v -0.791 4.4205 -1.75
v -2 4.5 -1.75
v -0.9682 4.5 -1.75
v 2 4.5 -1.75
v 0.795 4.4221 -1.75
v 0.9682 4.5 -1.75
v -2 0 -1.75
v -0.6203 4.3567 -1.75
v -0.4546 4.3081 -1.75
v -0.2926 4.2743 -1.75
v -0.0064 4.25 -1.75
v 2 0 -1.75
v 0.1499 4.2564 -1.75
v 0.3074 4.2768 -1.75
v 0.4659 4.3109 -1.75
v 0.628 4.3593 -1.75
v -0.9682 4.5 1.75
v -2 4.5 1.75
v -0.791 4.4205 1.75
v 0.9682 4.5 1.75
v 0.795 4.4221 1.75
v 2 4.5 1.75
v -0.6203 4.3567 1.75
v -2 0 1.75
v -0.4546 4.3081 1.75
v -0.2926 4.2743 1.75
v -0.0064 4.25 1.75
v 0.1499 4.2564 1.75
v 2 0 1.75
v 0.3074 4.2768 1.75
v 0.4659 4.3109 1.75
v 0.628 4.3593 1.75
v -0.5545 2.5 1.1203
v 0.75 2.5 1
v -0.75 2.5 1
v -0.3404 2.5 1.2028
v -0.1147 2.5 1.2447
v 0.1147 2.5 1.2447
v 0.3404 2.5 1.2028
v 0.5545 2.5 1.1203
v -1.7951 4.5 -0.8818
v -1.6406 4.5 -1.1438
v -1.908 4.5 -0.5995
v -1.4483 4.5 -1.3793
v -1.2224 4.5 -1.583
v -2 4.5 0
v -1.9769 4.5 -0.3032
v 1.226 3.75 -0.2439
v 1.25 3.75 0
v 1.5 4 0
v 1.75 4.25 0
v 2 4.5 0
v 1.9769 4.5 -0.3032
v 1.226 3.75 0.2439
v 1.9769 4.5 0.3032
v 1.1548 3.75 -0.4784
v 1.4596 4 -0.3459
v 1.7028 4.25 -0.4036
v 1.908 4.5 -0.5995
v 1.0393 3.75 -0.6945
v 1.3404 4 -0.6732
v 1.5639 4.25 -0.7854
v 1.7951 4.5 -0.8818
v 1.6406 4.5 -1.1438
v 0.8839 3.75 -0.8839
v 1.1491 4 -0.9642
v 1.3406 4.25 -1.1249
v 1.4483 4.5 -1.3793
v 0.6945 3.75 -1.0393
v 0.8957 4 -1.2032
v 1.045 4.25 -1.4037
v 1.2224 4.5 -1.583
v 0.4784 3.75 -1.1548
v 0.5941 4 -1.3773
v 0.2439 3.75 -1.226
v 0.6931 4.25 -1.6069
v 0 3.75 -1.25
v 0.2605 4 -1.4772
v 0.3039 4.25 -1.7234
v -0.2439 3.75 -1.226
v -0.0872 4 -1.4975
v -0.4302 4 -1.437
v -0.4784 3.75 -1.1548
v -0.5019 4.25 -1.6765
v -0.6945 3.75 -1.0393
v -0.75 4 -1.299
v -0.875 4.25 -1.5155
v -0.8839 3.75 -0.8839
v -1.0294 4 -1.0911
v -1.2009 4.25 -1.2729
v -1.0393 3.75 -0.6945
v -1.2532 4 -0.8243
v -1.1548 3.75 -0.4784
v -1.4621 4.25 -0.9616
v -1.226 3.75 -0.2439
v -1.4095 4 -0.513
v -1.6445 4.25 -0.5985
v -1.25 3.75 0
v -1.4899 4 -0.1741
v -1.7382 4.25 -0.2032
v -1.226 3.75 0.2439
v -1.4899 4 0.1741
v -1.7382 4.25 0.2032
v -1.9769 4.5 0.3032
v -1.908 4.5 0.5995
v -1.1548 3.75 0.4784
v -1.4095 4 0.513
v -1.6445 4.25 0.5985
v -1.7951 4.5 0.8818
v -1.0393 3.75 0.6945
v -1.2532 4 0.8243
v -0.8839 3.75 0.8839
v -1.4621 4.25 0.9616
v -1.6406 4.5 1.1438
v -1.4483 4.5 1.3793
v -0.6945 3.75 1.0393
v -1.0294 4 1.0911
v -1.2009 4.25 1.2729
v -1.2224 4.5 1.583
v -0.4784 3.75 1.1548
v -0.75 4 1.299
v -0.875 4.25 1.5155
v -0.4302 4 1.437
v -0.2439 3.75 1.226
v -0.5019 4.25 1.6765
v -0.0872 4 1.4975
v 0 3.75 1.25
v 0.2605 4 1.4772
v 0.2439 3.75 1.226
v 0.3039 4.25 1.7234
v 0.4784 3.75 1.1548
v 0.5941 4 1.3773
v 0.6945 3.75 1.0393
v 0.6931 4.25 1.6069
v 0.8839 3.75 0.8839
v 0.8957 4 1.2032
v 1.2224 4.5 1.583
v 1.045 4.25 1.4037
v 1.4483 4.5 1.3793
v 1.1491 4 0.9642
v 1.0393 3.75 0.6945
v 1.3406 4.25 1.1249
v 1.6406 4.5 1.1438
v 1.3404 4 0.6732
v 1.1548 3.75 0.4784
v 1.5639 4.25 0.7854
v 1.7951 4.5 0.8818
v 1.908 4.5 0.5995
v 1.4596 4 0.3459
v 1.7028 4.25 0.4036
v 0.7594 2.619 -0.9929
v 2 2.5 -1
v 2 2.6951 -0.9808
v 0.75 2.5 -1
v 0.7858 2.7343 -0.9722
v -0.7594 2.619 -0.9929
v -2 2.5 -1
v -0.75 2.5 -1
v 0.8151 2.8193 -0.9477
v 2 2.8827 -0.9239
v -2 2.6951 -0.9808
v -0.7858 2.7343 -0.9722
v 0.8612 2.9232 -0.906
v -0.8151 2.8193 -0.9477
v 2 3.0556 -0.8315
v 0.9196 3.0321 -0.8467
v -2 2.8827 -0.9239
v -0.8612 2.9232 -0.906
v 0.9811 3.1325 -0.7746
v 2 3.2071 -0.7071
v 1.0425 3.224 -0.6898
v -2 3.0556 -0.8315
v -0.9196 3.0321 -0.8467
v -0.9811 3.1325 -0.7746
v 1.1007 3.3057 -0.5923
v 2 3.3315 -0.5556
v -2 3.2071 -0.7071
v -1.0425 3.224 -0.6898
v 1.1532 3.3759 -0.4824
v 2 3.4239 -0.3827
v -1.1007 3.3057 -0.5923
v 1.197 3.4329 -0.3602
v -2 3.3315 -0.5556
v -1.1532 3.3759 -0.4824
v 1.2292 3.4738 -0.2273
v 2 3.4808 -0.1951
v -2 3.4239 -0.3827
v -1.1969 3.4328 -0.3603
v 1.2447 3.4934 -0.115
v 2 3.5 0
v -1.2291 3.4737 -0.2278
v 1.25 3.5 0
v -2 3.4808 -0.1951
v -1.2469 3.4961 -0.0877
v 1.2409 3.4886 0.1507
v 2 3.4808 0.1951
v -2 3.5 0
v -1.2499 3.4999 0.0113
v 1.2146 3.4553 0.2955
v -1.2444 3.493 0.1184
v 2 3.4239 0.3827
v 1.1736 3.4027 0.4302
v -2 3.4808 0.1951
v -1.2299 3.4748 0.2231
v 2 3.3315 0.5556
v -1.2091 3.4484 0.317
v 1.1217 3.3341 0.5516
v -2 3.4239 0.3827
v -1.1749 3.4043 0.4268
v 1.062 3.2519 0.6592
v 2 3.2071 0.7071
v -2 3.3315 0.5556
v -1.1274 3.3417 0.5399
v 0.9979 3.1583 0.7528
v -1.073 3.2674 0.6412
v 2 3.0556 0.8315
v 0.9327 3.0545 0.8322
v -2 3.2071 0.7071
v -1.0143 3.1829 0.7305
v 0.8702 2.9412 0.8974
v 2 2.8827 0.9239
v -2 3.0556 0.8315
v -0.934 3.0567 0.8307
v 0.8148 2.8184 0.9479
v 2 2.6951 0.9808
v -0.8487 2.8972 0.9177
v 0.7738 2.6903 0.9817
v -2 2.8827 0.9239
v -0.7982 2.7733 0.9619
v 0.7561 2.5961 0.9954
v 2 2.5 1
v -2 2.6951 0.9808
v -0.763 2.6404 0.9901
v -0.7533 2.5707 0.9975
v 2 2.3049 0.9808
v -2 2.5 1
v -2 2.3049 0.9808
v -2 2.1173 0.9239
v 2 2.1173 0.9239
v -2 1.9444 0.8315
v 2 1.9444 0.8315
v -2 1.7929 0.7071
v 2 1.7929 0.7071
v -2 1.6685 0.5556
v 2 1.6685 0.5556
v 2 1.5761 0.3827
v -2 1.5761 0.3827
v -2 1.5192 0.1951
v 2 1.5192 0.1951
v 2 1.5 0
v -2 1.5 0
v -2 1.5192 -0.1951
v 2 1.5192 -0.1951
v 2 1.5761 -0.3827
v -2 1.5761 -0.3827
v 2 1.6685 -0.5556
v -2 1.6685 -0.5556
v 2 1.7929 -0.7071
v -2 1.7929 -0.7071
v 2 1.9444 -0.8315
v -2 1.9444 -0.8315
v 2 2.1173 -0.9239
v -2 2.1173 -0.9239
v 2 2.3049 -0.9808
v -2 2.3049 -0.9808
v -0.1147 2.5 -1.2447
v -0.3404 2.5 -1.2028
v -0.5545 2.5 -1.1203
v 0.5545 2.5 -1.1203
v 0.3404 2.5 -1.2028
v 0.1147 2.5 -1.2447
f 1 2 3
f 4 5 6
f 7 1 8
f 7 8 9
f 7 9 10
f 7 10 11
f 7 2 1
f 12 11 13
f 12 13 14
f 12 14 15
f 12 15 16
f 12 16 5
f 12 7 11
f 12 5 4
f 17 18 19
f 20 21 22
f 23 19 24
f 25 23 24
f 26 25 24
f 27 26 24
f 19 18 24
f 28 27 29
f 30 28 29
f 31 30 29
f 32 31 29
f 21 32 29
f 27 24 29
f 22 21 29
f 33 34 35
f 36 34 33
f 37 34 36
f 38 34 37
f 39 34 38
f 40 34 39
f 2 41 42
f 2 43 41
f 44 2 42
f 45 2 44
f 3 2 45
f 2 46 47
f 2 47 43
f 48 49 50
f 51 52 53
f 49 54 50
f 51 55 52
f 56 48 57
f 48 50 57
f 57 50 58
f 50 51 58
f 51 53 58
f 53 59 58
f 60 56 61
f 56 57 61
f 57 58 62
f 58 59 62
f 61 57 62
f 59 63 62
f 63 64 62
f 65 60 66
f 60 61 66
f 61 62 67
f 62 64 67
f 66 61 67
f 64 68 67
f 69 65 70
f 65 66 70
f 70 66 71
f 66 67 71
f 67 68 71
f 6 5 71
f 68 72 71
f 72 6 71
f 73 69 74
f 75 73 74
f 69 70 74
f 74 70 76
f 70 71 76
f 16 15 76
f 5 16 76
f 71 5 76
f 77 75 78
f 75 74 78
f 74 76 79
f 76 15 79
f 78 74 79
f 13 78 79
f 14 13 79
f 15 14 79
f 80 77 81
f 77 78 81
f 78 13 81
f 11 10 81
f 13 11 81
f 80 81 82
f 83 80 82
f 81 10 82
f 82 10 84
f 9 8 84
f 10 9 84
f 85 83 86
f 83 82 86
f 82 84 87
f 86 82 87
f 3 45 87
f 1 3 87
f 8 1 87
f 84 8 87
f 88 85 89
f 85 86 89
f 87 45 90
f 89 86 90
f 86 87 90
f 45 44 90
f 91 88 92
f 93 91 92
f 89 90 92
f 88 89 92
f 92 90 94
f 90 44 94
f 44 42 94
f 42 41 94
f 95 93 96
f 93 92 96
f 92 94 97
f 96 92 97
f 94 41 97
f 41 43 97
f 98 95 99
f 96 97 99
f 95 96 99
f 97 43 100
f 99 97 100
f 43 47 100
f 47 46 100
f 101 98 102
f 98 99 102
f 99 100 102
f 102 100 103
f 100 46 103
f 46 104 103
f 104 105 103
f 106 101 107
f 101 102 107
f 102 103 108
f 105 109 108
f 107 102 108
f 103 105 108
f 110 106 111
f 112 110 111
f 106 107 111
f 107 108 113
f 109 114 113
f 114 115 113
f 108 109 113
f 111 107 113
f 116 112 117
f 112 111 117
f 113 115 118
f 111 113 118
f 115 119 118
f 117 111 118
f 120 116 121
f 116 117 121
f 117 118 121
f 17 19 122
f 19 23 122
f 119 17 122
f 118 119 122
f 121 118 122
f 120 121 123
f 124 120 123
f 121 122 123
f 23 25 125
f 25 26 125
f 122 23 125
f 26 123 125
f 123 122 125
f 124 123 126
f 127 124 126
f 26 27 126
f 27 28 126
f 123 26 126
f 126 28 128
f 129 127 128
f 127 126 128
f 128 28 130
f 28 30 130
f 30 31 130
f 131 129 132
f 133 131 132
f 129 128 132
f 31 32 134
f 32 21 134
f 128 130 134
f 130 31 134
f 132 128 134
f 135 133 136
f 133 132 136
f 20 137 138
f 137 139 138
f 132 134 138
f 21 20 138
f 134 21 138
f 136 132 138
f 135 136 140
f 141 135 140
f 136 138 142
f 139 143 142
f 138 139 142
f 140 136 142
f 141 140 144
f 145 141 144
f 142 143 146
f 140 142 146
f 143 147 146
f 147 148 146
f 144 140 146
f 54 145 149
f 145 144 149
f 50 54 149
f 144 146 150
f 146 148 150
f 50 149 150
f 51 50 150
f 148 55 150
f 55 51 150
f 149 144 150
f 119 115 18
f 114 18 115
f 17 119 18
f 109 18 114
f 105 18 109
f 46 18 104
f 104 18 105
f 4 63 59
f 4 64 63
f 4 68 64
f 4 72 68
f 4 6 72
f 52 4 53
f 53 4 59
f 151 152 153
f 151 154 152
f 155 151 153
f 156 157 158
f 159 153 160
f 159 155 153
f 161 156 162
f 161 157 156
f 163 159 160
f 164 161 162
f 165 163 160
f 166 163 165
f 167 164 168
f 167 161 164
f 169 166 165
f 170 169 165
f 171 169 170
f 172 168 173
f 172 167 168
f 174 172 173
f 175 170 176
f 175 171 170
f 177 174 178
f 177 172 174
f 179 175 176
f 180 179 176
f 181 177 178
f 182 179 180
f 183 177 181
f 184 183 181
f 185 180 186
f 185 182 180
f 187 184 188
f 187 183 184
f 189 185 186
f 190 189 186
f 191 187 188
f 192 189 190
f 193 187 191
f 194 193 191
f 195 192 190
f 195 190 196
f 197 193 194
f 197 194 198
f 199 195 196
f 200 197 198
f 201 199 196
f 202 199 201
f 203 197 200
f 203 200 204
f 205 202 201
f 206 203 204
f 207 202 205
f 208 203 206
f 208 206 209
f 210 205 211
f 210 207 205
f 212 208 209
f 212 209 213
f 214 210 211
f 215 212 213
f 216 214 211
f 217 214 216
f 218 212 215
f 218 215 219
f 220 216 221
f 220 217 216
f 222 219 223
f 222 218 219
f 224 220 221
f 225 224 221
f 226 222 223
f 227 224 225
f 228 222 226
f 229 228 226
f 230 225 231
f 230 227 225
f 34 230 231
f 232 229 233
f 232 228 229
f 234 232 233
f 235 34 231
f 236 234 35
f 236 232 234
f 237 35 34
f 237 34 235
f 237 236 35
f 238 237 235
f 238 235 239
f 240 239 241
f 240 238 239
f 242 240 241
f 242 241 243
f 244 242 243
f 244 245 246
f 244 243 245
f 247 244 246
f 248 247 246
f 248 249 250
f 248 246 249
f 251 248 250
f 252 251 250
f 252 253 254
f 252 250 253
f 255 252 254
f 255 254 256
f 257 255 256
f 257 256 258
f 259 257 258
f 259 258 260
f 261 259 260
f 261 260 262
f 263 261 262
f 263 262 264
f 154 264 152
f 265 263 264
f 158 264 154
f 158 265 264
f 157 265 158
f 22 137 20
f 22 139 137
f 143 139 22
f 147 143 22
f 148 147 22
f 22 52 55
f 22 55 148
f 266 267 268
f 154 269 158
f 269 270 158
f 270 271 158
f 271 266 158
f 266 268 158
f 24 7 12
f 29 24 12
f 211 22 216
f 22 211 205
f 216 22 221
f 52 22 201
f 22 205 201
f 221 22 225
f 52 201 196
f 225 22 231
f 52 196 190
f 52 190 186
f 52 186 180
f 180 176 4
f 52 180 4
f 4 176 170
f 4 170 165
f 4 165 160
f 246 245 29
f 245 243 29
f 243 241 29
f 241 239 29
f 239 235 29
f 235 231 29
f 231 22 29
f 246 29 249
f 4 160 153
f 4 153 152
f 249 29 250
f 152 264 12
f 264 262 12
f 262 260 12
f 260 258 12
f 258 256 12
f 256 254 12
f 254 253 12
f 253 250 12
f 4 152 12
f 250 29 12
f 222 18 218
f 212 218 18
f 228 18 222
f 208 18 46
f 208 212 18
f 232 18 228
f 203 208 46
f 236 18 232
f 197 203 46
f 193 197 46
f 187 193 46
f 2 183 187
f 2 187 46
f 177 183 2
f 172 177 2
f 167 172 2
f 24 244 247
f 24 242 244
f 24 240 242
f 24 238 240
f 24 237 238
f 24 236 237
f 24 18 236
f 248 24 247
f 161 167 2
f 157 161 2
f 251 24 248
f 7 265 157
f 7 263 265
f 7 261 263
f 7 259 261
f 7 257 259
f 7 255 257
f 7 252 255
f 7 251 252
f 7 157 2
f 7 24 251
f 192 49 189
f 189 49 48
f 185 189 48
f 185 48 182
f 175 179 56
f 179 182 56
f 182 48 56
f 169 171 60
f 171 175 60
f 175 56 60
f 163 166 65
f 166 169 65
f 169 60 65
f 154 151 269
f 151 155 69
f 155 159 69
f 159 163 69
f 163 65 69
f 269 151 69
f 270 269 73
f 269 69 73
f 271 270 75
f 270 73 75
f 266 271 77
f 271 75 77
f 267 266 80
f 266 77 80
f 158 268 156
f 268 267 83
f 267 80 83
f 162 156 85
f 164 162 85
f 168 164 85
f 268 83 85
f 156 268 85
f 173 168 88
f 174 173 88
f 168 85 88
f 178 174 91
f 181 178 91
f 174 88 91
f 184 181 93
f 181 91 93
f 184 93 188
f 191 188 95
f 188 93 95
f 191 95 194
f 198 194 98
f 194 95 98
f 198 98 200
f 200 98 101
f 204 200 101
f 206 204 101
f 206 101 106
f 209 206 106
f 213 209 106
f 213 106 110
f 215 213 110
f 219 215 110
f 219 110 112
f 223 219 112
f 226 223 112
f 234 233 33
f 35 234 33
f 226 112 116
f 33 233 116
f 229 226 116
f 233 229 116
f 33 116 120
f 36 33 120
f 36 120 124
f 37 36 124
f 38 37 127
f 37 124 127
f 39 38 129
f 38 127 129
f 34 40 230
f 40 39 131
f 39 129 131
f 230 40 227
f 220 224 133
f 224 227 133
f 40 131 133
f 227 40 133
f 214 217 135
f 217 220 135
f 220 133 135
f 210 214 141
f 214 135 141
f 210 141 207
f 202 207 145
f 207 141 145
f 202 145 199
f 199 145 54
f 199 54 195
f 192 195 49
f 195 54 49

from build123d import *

# Parameters (mm, degrees)
TERMINALBODYS_W        = 4
TERMINALBODYS_H        = 3.5
TERMINAL_BODY_DEPTH    = 4.5
WIRE_ACCESS_DEPTH      = 6.22613624
WIRE_ACCESS_DEPTH_BACK = 6.22613624
WIREACCESSS_R          = 1


# Read off the part's stored shape, not the designer's step: M3x0.5 Tapped Hole1
with BuildPart() as part:
    # TerminalBodyS → TERMINAL BODY (new body)
    with BuildSketch(Plane(origin=(0, 0, 0), x_dir=(1, 0, 0), z_dir=(0, 1, 0))):
        Rectangle(TERMINALBODYS_W, TERMINALBODYS_H)
    extrude(amount=TERMINAL_BODY_DEPTH)

    # WireAccessS → WIRE ACCESS (cut, two sides: drawn at the far end of the back side and taken through both)
    with BuildSketch(Plane(origin=(0, 0, 0), x_dir=(0, 0, -1), z_dir=(1, 0, 0)).offset(-WIRE_ACCESS_DEPTH_BACK)):
        with Locations((0, 2.5)):
            Circle(WIREACCESSS_R)
    extrude(amount=WIRE_ACCESS_DEPTH + WIRE_ACCESS_DEPTH_BACK, mode=Mode.SUBTRACT)

    # M3x0.5 Tapped Hole1 outline → M3x0.5 Tapped Hole1 (revolve, cut)
    with BuildSketch(Plane.XY):
        Polygon((2, 4.5), (0, 4.5), (0, 2.5), (1.25, 2.5), (1.25, 3.75), align=None)
    revolve(axis=Axis((0, 0, 0), (0, 1, 0)), mode=Mode.SUBTRACT)


solid = part.part
